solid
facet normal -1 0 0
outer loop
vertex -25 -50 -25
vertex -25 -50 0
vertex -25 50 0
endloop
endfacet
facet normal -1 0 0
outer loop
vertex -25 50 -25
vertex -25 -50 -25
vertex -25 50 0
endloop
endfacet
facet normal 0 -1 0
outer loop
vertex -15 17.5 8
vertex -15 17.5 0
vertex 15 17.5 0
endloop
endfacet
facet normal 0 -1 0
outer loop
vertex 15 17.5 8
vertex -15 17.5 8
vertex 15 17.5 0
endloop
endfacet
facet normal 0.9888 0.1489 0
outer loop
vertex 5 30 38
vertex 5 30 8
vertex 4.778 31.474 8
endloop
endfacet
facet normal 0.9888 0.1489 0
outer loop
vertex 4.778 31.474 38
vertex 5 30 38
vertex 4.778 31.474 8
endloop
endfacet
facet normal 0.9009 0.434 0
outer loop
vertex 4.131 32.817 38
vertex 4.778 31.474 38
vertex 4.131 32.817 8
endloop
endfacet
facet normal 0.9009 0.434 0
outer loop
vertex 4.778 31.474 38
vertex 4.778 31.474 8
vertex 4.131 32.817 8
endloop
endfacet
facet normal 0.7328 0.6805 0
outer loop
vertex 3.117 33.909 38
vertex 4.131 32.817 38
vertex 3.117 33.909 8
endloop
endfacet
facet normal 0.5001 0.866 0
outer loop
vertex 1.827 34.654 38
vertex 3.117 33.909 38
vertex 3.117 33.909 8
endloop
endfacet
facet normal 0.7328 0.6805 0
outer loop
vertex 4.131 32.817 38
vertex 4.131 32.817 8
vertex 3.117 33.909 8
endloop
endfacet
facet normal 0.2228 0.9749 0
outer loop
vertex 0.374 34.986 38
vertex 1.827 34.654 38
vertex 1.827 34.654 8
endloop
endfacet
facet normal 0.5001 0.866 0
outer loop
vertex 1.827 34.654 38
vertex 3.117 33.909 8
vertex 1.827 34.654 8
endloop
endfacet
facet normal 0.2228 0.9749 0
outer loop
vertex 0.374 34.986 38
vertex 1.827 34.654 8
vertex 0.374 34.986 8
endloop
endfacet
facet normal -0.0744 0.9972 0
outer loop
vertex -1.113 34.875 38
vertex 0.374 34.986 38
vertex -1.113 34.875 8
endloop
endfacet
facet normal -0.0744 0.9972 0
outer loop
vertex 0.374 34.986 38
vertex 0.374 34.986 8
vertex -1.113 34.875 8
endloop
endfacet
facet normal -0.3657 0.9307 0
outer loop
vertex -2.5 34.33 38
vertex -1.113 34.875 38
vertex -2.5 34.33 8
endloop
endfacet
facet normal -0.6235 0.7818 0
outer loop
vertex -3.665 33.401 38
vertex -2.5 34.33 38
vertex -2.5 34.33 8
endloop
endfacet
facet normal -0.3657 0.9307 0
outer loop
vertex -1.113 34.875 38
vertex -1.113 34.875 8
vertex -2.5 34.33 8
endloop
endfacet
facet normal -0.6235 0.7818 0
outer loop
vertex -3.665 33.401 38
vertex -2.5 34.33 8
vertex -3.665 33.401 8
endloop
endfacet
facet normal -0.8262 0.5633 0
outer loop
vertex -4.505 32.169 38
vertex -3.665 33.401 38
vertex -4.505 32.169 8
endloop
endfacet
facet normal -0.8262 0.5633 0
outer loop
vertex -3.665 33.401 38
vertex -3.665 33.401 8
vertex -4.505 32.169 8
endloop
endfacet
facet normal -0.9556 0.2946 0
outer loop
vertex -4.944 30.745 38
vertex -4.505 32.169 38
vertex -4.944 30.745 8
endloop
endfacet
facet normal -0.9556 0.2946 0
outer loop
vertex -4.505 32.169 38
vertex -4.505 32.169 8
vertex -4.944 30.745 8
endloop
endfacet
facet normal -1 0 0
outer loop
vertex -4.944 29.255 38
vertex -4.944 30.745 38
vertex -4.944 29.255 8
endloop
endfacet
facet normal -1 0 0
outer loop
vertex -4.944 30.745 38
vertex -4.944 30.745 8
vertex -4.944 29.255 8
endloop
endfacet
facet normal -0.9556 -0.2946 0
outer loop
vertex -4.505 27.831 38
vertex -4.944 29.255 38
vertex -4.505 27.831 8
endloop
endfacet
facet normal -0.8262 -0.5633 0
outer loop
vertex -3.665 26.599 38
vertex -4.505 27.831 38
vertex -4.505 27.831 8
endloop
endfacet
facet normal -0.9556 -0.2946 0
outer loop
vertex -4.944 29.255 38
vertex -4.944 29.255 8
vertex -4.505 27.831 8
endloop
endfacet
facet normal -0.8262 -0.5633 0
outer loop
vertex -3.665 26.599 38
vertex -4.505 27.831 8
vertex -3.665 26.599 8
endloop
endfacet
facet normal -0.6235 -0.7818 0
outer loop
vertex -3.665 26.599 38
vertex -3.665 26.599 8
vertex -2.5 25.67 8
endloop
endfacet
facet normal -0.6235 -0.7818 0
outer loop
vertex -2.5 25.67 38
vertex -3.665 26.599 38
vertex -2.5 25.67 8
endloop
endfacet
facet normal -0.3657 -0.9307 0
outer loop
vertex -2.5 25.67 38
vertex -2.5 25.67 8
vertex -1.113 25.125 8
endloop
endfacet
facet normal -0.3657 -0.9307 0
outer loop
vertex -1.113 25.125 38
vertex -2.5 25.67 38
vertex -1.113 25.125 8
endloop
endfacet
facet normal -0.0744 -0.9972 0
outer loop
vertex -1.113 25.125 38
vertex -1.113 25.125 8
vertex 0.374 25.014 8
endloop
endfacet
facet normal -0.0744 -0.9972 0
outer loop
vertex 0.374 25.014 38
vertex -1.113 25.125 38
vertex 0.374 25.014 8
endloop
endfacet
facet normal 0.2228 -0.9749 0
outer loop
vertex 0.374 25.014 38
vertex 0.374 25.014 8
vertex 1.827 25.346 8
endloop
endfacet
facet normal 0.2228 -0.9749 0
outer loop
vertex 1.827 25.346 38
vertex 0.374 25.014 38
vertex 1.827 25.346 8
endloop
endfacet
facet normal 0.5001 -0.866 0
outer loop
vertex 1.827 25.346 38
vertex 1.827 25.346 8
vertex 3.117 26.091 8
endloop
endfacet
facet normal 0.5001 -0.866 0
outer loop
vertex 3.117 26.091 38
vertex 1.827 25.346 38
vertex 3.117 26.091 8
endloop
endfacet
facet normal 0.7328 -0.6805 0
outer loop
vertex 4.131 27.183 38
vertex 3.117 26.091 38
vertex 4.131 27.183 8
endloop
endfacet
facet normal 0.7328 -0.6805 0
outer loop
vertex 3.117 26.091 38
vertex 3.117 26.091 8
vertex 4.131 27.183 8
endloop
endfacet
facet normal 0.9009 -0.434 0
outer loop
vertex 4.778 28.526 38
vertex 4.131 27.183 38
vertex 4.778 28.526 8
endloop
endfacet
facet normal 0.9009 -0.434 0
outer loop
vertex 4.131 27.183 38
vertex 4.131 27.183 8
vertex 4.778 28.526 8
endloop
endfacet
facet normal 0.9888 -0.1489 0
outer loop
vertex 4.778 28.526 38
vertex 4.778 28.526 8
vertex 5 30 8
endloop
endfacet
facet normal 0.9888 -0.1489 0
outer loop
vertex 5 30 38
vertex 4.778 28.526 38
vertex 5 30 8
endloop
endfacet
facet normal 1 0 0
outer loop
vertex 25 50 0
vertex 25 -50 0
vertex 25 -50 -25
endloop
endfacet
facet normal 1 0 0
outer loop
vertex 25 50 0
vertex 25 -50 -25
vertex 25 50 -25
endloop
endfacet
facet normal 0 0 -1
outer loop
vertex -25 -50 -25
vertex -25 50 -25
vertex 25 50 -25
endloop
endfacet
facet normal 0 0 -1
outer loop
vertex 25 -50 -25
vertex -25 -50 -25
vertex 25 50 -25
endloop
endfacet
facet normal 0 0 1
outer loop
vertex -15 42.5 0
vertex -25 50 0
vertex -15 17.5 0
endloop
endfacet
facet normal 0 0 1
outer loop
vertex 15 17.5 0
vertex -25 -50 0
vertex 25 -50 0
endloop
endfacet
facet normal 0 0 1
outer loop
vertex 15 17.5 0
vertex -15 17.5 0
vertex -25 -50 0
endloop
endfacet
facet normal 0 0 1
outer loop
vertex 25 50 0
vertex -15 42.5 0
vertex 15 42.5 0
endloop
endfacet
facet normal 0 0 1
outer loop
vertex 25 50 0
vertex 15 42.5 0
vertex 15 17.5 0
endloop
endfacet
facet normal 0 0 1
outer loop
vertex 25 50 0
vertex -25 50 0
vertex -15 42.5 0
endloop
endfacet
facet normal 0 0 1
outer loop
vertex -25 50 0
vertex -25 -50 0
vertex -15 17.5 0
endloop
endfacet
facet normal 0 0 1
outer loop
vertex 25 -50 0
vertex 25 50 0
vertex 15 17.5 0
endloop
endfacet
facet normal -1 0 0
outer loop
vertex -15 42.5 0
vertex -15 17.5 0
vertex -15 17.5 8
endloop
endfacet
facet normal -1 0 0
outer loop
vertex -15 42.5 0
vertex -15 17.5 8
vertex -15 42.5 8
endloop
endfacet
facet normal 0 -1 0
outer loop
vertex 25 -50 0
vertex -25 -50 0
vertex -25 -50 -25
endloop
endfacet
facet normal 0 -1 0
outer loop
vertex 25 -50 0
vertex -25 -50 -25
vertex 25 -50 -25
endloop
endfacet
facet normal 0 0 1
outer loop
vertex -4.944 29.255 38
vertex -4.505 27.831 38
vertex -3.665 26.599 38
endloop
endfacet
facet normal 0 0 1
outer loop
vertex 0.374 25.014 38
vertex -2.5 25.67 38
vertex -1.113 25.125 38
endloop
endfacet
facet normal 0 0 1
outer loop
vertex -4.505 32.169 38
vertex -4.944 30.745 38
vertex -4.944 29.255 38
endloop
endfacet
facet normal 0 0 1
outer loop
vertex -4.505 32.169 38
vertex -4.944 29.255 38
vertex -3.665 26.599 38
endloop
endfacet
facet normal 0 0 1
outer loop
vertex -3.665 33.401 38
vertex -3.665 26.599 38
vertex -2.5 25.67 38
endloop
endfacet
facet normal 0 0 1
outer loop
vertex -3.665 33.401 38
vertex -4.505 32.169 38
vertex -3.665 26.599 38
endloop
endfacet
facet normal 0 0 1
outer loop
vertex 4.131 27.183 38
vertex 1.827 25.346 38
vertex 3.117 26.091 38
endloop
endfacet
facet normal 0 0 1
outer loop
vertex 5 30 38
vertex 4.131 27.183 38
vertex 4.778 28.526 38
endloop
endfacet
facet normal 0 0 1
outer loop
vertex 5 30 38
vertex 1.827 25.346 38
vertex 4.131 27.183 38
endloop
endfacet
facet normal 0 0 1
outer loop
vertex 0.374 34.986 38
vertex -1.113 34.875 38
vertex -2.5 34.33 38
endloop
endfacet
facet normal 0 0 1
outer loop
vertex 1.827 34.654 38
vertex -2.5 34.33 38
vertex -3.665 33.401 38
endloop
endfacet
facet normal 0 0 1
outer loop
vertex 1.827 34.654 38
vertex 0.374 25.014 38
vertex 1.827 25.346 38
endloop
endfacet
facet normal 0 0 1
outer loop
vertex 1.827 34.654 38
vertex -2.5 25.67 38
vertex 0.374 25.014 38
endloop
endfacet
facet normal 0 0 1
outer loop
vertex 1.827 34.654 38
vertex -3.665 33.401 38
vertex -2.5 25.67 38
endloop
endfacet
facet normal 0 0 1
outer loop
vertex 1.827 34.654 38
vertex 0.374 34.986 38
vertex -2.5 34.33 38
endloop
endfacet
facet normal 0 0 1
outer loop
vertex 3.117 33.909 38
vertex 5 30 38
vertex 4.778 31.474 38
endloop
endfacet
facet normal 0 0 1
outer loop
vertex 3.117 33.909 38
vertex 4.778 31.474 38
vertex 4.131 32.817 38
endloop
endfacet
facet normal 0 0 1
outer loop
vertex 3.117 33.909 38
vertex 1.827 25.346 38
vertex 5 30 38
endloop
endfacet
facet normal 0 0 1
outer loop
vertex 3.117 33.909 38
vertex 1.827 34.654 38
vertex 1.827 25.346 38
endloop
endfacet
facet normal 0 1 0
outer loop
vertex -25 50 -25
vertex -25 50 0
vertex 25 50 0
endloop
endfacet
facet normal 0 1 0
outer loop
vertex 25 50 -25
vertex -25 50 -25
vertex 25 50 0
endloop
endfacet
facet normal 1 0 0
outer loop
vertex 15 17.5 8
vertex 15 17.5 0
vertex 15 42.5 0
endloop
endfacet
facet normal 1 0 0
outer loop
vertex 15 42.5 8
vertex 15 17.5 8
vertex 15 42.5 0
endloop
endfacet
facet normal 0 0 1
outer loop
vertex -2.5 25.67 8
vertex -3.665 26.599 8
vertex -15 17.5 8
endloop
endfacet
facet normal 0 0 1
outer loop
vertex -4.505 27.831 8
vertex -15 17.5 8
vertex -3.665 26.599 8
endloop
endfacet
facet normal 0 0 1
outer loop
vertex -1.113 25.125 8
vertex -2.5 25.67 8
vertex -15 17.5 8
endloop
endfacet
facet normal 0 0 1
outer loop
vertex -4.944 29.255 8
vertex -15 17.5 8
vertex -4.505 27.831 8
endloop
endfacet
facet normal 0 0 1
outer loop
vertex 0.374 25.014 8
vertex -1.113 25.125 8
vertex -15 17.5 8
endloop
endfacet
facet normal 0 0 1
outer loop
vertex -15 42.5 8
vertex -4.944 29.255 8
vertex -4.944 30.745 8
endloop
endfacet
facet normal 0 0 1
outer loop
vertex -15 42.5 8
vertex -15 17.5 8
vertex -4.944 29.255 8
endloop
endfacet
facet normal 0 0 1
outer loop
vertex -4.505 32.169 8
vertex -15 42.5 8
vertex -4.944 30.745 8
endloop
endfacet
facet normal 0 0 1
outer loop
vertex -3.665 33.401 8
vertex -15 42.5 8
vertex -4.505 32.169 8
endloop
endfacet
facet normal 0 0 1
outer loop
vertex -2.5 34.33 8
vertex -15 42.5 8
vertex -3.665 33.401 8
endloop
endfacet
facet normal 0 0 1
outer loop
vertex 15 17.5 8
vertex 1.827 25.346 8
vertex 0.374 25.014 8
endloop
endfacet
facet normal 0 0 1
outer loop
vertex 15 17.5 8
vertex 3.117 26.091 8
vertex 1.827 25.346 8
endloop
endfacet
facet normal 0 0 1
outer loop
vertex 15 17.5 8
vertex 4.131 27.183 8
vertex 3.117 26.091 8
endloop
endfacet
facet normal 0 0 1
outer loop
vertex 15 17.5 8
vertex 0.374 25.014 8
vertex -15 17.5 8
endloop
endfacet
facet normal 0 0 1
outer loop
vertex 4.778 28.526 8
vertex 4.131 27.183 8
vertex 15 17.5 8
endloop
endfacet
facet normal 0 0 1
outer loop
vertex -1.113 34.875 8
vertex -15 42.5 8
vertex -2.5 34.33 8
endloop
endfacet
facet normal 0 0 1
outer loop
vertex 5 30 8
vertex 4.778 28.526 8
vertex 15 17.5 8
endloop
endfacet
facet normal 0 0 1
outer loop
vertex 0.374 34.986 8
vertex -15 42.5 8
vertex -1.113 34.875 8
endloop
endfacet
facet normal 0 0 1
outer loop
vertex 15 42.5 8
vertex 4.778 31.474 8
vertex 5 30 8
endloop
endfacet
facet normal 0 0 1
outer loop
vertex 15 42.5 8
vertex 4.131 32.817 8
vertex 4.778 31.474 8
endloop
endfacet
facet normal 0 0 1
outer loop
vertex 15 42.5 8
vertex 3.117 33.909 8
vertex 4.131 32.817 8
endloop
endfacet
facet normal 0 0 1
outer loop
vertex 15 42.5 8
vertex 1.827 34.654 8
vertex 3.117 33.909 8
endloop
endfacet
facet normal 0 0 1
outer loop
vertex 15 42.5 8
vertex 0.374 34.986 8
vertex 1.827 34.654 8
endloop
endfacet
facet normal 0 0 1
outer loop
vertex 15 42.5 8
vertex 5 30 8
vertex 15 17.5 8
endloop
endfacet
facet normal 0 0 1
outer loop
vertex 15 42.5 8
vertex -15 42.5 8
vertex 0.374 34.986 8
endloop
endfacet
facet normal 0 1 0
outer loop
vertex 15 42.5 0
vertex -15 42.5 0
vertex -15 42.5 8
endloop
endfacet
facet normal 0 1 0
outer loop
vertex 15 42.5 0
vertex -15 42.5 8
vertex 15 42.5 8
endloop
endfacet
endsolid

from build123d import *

# Parameters (mm, degrees)
SKETCH2_W           = 50
SKETCH2_H           = 100
BOSS_EXTRUDE1_DEPTH = 25
SKETCH5_W           = 30
SKETCH5_H           = 25
BOSS_EXTRUDE3_DEPTH = 8
SKETCH6_R           = 5
BOSS_EXTRUDE4_DEPTH = 30


with BuildPart() as part:
    # Sketch2 → Boss-Extrude1 (new body)
    with BuildSketch(Plane.XY):
        Rectangle(SKETCH2_W, SKETCH2_H)
    extrude(amount=-BOSS_EXTRUDE1_DEPTH)

    # Sketch5 → Boss-Extrude3 (add)
    with BuildSketch(Plane.XY):
        with Locations((0, 30)):
            Rectangle(SKETCH5_W, SKETCH5_H)
    extrude(amount=BOSS_EXTRUDE3_DEPTH)

    # Sketch6 → Boss-Extrude4 (add)
    with BuildSketch(Plane.XY.offset(8)):
        with Locations((0, 30)):
            Circle(SKETCH6_R)
    extrude(amount=BOSS_EXTRUDE4_DEPTH)


solid = part.part
